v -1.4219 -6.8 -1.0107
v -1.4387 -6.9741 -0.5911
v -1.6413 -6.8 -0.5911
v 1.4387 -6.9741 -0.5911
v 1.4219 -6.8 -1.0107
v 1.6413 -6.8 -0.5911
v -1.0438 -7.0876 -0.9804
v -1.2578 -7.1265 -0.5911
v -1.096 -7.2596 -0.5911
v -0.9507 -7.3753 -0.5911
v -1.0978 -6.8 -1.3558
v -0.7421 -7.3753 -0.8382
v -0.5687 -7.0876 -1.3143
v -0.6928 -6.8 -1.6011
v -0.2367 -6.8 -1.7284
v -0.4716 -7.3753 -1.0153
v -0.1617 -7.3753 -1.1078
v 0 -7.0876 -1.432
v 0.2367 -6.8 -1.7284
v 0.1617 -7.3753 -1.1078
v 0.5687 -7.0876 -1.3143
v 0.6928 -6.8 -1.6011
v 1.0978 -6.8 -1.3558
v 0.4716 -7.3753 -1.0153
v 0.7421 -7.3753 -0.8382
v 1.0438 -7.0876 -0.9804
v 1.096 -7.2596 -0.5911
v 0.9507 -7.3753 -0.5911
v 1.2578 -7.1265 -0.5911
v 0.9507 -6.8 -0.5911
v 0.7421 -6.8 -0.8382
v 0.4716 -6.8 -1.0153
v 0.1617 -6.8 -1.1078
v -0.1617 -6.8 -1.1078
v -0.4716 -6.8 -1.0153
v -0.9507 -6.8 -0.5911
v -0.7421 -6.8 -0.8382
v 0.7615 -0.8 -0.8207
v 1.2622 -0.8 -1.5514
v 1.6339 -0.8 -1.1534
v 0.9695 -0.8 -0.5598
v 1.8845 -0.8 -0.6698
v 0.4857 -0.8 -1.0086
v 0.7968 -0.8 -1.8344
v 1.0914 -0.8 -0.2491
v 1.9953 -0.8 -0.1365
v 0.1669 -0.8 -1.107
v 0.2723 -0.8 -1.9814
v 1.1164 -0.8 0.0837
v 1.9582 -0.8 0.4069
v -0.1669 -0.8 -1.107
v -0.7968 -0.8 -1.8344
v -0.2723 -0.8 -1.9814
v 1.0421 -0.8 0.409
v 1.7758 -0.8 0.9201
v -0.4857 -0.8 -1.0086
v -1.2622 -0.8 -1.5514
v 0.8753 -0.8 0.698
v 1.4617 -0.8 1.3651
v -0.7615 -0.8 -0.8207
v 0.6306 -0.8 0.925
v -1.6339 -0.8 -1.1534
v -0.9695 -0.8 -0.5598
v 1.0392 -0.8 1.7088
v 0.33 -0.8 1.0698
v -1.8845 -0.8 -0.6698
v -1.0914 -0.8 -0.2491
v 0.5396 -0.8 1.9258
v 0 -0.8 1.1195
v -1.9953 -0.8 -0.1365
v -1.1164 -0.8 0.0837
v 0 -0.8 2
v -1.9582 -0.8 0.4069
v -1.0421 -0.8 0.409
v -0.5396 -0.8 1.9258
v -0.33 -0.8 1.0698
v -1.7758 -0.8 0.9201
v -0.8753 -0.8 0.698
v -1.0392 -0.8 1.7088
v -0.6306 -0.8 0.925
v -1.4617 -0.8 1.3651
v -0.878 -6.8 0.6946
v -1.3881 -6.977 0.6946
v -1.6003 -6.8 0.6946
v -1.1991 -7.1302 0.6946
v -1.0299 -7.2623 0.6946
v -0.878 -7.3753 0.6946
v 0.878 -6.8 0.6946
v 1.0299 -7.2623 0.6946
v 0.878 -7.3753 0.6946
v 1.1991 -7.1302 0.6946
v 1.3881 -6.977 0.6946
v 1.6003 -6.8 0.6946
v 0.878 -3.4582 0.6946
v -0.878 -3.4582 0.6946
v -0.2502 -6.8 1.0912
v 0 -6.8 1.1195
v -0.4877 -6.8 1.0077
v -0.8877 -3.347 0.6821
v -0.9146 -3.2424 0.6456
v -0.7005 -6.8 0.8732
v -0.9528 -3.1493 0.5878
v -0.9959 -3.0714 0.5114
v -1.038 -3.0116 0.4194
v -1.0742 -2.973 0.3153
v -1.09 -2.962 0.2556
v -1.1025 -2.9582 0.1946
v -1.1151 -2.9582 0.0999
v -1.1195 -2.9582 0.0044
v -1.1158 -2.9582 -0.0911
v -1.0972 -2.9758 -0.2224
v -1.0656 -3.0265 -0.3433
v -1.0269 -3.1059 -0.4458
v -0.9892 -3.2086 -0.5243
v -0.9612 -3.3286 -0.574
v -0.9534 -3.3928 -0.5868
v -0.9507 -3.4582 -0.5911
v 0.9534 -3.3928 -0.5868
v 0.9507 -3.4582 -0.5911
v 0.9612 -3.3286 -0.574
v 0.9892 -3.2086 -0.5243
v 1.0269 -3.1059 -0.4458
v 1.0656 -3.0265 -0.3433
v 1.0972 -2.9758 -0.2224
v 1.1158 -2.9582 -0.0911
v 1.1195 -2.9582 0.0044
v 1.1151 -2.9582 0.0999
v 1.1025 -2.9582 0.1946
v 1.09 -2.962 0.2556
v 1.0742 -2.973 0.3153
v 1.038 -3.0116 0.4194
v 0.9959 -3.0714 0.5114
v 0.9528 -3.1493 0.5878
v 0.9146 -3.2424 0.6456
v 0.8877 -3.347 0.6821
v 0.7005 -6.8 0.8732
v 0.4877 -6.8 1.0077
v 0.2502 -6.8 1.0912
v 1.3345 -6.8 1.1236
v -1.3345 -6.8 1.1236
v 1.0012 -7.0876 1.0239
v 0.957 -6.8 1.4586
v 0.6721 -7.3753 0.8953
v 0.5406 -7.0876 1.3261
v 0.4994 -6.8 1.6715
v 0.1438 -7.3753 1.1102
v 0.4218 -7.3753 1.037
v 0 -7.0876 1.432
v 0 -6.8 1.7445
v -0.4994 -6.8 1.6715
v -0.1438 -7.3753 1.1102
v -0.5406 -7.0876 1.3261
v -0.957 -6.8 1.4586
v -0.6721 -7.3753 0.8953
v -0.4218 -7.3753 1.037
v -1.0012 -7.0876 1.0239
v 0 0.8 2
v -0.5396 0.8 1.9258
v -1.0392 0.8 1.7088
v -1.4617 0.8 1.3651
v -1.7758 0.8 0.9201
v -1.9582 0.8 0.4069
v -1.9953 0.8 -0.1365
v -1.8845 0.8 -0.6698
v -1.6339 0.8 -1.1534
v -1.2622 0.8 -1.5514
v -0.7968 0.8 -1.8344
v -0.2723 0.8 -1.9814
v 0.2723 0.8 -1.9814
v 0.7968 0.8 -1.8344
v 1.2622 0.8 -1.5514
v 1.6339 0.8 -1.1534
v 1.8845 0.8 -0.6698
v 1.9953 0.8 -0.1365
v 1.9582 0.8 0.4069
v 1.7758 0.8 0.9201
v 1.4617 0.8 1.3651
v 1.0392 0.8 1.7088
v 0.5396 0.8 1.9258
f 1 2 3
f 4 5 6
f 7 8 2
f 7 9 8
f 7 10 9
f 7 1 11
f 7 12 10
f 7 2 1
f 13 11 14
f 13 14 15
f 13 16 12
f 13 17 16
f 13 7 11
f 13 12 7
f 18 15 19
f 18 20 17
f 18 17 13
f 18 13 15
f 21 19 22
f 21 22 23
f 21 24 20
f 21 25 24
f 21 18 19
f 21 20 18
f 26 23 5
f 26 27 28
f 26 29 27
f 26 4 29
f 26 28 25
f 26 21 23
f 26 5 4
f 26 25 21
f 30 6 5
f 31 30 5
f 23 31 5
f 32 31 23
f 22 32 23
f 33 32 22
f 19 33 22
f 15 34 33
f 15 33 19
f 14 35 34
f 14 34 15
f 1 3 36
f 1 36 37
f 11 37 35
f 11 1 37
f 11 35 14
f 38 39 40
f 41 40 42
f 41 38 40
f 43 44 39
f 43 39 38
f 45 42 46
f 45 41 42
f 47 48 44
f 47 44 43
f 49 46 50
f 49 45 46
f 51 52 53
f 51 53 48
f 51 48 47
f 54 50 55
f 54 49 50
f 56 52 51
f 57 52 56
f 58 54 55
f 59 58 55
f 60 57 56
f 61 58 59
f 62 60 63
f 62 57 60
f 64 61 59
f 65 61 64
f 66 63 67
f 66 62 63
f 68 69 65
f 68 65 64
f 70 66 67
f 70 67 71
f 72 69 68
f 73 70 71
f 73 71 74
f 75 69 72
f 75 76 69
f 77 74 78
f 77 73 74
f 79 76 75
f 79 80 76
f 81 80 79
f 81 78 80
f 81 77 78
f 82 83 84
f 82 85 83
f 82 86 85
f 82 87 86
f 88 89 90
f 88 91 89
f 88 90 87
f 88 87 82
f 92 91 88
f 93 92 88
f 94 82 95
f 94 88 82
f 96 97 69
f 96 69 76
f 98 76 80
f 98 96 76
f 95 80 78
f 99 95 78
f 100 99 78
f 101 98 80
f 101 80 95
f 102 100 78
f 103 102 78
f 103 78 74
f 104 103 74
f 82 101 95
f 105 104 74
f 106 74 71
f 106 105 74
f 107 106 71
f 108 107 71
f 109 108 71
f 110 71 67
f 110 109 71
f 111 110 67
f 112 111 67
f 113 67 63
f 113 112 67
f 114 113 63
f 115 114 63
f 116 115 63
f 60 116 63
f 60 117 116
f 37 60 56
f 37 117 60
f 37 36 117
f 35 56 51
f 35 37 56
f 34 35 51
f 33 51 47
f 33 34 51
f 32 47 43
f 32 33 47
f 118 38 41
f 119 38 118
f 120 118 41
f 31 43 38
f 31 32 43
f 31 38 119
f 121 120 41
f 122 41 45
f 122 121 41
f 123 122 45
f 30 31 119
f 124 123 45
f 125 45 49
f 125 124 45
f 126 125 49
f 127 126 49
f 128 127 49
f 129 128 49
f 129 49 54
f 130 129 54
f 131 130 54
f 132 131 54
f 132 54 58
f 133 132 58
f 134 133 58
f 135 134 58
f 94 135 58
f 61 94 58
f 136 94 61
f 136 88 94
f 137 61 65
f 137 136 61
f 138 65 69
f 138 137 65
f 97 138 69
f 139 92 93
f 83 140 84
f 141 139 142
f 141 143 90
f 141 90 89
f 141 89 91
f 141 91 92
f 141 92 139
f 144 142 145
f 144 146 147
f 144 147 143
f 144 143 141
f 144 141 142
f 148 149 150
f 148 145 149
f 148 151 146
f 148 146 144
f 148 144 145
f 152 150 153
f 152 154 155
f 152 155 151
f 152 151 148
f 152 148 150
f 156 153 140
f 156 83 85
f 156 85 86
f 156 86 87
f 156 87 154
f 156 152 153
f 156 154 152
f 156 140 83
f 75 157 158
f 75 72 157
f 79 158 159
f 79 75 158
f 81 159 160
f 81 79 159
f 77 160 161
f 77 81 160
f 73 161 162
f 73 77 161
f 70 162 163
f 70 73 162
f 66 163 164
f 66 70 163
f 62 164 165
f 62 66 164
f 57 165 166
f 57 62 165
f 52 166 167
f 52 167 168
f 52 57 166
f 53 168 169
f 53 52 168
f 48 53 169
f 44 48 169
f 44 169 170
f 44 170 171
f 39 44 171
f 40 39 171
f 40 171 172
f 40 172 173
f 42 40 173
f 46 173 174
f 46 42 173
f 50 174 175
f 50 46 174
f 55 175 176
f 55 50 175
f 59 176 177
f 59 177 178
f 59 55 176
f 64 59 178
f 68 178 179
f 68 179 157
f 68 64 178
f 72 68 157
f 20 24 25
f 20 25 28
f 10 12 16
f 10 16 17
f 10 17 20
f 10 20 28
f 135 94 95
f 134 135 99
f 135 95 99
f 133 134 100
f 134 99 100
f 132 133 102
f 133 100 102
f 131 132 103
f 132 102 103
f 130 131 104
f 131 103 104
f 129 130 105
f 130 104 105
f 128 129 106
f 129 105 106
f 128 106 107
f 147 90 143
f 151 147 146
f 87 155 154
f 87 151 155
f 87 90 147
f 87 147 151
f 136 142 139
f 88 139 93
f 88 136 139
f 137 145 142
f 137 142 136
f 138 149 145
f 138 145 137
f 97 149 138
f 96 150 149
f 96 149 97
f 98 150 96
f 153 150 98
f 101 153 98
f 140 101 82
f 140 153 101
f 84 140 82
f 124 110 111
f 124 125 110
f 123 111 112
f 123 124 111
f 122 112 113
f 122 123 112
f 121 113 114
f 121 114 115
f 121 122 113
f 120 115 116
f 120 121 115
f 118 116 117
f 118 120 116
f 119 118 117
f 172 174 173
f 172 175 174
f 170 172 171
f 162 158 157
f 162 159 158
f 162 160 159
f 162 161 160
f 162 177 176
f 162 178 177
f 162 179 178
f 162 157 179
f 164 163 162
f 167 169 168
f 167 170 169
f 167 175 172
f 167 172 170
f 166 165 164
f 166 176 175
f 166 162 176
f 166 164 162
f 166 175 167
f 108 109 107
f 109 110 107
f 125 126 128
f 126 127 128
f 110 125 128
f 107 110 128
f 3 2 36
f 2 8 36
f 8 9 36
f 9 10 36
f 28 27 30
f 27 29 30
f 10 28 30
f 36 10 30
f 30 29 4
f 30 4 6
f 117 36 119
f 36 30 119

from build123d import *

# Parameters (mm, degrees)
F2_W     = 4.5
F2_H     = 1.2857143477
F3_DEPTH = 12.5
F4_R     = 0.5


with BuildPart() as f1:
    # F0 (on Right) → F1 (revolve)
    with BuildSketch(Plane.YZ):
        Polygon((-7.3752667787, 1.1195156959), (-6.8, 1.1195156959), (-6.8, 1.7445156959), align=None)
        Polygon((-7.3752667787, 0), (-0.8, 0), (-0.8, 1.1195156959), (-6.8, 1.1195156959), (-7.3752667787, 1.1195156959), align=None)
        Polygon((-0.8, 0), (0.8, 0), (0.8, 2), (-0.8, 2), (-0.8, 1.1195156959), align=None)
    revolve(axis=Axis((0, -2.8302398277, 0), (0, -1, 0)))

    # F2 (on Right) → F3 (cut, symmetric)
    with BuildSketch(Plane.YZ):
        with Locations((-5.2082390757, 0.0517627923)):
            Rectangle(F2_W, F2_H)
    extrude(amount=F3_DEPTH, both=True, mode=Mode.SUBTRACT)

    # F4
    f4_edges = [f1.edges().sort_by_distance(p)[0] for p in [
        (0, -2.958239, -0.591094),
        (0, -2.958239, 0.69462),
    ]]
    fillet(f4_edges, radius=F4_R)


solid = f1.part
